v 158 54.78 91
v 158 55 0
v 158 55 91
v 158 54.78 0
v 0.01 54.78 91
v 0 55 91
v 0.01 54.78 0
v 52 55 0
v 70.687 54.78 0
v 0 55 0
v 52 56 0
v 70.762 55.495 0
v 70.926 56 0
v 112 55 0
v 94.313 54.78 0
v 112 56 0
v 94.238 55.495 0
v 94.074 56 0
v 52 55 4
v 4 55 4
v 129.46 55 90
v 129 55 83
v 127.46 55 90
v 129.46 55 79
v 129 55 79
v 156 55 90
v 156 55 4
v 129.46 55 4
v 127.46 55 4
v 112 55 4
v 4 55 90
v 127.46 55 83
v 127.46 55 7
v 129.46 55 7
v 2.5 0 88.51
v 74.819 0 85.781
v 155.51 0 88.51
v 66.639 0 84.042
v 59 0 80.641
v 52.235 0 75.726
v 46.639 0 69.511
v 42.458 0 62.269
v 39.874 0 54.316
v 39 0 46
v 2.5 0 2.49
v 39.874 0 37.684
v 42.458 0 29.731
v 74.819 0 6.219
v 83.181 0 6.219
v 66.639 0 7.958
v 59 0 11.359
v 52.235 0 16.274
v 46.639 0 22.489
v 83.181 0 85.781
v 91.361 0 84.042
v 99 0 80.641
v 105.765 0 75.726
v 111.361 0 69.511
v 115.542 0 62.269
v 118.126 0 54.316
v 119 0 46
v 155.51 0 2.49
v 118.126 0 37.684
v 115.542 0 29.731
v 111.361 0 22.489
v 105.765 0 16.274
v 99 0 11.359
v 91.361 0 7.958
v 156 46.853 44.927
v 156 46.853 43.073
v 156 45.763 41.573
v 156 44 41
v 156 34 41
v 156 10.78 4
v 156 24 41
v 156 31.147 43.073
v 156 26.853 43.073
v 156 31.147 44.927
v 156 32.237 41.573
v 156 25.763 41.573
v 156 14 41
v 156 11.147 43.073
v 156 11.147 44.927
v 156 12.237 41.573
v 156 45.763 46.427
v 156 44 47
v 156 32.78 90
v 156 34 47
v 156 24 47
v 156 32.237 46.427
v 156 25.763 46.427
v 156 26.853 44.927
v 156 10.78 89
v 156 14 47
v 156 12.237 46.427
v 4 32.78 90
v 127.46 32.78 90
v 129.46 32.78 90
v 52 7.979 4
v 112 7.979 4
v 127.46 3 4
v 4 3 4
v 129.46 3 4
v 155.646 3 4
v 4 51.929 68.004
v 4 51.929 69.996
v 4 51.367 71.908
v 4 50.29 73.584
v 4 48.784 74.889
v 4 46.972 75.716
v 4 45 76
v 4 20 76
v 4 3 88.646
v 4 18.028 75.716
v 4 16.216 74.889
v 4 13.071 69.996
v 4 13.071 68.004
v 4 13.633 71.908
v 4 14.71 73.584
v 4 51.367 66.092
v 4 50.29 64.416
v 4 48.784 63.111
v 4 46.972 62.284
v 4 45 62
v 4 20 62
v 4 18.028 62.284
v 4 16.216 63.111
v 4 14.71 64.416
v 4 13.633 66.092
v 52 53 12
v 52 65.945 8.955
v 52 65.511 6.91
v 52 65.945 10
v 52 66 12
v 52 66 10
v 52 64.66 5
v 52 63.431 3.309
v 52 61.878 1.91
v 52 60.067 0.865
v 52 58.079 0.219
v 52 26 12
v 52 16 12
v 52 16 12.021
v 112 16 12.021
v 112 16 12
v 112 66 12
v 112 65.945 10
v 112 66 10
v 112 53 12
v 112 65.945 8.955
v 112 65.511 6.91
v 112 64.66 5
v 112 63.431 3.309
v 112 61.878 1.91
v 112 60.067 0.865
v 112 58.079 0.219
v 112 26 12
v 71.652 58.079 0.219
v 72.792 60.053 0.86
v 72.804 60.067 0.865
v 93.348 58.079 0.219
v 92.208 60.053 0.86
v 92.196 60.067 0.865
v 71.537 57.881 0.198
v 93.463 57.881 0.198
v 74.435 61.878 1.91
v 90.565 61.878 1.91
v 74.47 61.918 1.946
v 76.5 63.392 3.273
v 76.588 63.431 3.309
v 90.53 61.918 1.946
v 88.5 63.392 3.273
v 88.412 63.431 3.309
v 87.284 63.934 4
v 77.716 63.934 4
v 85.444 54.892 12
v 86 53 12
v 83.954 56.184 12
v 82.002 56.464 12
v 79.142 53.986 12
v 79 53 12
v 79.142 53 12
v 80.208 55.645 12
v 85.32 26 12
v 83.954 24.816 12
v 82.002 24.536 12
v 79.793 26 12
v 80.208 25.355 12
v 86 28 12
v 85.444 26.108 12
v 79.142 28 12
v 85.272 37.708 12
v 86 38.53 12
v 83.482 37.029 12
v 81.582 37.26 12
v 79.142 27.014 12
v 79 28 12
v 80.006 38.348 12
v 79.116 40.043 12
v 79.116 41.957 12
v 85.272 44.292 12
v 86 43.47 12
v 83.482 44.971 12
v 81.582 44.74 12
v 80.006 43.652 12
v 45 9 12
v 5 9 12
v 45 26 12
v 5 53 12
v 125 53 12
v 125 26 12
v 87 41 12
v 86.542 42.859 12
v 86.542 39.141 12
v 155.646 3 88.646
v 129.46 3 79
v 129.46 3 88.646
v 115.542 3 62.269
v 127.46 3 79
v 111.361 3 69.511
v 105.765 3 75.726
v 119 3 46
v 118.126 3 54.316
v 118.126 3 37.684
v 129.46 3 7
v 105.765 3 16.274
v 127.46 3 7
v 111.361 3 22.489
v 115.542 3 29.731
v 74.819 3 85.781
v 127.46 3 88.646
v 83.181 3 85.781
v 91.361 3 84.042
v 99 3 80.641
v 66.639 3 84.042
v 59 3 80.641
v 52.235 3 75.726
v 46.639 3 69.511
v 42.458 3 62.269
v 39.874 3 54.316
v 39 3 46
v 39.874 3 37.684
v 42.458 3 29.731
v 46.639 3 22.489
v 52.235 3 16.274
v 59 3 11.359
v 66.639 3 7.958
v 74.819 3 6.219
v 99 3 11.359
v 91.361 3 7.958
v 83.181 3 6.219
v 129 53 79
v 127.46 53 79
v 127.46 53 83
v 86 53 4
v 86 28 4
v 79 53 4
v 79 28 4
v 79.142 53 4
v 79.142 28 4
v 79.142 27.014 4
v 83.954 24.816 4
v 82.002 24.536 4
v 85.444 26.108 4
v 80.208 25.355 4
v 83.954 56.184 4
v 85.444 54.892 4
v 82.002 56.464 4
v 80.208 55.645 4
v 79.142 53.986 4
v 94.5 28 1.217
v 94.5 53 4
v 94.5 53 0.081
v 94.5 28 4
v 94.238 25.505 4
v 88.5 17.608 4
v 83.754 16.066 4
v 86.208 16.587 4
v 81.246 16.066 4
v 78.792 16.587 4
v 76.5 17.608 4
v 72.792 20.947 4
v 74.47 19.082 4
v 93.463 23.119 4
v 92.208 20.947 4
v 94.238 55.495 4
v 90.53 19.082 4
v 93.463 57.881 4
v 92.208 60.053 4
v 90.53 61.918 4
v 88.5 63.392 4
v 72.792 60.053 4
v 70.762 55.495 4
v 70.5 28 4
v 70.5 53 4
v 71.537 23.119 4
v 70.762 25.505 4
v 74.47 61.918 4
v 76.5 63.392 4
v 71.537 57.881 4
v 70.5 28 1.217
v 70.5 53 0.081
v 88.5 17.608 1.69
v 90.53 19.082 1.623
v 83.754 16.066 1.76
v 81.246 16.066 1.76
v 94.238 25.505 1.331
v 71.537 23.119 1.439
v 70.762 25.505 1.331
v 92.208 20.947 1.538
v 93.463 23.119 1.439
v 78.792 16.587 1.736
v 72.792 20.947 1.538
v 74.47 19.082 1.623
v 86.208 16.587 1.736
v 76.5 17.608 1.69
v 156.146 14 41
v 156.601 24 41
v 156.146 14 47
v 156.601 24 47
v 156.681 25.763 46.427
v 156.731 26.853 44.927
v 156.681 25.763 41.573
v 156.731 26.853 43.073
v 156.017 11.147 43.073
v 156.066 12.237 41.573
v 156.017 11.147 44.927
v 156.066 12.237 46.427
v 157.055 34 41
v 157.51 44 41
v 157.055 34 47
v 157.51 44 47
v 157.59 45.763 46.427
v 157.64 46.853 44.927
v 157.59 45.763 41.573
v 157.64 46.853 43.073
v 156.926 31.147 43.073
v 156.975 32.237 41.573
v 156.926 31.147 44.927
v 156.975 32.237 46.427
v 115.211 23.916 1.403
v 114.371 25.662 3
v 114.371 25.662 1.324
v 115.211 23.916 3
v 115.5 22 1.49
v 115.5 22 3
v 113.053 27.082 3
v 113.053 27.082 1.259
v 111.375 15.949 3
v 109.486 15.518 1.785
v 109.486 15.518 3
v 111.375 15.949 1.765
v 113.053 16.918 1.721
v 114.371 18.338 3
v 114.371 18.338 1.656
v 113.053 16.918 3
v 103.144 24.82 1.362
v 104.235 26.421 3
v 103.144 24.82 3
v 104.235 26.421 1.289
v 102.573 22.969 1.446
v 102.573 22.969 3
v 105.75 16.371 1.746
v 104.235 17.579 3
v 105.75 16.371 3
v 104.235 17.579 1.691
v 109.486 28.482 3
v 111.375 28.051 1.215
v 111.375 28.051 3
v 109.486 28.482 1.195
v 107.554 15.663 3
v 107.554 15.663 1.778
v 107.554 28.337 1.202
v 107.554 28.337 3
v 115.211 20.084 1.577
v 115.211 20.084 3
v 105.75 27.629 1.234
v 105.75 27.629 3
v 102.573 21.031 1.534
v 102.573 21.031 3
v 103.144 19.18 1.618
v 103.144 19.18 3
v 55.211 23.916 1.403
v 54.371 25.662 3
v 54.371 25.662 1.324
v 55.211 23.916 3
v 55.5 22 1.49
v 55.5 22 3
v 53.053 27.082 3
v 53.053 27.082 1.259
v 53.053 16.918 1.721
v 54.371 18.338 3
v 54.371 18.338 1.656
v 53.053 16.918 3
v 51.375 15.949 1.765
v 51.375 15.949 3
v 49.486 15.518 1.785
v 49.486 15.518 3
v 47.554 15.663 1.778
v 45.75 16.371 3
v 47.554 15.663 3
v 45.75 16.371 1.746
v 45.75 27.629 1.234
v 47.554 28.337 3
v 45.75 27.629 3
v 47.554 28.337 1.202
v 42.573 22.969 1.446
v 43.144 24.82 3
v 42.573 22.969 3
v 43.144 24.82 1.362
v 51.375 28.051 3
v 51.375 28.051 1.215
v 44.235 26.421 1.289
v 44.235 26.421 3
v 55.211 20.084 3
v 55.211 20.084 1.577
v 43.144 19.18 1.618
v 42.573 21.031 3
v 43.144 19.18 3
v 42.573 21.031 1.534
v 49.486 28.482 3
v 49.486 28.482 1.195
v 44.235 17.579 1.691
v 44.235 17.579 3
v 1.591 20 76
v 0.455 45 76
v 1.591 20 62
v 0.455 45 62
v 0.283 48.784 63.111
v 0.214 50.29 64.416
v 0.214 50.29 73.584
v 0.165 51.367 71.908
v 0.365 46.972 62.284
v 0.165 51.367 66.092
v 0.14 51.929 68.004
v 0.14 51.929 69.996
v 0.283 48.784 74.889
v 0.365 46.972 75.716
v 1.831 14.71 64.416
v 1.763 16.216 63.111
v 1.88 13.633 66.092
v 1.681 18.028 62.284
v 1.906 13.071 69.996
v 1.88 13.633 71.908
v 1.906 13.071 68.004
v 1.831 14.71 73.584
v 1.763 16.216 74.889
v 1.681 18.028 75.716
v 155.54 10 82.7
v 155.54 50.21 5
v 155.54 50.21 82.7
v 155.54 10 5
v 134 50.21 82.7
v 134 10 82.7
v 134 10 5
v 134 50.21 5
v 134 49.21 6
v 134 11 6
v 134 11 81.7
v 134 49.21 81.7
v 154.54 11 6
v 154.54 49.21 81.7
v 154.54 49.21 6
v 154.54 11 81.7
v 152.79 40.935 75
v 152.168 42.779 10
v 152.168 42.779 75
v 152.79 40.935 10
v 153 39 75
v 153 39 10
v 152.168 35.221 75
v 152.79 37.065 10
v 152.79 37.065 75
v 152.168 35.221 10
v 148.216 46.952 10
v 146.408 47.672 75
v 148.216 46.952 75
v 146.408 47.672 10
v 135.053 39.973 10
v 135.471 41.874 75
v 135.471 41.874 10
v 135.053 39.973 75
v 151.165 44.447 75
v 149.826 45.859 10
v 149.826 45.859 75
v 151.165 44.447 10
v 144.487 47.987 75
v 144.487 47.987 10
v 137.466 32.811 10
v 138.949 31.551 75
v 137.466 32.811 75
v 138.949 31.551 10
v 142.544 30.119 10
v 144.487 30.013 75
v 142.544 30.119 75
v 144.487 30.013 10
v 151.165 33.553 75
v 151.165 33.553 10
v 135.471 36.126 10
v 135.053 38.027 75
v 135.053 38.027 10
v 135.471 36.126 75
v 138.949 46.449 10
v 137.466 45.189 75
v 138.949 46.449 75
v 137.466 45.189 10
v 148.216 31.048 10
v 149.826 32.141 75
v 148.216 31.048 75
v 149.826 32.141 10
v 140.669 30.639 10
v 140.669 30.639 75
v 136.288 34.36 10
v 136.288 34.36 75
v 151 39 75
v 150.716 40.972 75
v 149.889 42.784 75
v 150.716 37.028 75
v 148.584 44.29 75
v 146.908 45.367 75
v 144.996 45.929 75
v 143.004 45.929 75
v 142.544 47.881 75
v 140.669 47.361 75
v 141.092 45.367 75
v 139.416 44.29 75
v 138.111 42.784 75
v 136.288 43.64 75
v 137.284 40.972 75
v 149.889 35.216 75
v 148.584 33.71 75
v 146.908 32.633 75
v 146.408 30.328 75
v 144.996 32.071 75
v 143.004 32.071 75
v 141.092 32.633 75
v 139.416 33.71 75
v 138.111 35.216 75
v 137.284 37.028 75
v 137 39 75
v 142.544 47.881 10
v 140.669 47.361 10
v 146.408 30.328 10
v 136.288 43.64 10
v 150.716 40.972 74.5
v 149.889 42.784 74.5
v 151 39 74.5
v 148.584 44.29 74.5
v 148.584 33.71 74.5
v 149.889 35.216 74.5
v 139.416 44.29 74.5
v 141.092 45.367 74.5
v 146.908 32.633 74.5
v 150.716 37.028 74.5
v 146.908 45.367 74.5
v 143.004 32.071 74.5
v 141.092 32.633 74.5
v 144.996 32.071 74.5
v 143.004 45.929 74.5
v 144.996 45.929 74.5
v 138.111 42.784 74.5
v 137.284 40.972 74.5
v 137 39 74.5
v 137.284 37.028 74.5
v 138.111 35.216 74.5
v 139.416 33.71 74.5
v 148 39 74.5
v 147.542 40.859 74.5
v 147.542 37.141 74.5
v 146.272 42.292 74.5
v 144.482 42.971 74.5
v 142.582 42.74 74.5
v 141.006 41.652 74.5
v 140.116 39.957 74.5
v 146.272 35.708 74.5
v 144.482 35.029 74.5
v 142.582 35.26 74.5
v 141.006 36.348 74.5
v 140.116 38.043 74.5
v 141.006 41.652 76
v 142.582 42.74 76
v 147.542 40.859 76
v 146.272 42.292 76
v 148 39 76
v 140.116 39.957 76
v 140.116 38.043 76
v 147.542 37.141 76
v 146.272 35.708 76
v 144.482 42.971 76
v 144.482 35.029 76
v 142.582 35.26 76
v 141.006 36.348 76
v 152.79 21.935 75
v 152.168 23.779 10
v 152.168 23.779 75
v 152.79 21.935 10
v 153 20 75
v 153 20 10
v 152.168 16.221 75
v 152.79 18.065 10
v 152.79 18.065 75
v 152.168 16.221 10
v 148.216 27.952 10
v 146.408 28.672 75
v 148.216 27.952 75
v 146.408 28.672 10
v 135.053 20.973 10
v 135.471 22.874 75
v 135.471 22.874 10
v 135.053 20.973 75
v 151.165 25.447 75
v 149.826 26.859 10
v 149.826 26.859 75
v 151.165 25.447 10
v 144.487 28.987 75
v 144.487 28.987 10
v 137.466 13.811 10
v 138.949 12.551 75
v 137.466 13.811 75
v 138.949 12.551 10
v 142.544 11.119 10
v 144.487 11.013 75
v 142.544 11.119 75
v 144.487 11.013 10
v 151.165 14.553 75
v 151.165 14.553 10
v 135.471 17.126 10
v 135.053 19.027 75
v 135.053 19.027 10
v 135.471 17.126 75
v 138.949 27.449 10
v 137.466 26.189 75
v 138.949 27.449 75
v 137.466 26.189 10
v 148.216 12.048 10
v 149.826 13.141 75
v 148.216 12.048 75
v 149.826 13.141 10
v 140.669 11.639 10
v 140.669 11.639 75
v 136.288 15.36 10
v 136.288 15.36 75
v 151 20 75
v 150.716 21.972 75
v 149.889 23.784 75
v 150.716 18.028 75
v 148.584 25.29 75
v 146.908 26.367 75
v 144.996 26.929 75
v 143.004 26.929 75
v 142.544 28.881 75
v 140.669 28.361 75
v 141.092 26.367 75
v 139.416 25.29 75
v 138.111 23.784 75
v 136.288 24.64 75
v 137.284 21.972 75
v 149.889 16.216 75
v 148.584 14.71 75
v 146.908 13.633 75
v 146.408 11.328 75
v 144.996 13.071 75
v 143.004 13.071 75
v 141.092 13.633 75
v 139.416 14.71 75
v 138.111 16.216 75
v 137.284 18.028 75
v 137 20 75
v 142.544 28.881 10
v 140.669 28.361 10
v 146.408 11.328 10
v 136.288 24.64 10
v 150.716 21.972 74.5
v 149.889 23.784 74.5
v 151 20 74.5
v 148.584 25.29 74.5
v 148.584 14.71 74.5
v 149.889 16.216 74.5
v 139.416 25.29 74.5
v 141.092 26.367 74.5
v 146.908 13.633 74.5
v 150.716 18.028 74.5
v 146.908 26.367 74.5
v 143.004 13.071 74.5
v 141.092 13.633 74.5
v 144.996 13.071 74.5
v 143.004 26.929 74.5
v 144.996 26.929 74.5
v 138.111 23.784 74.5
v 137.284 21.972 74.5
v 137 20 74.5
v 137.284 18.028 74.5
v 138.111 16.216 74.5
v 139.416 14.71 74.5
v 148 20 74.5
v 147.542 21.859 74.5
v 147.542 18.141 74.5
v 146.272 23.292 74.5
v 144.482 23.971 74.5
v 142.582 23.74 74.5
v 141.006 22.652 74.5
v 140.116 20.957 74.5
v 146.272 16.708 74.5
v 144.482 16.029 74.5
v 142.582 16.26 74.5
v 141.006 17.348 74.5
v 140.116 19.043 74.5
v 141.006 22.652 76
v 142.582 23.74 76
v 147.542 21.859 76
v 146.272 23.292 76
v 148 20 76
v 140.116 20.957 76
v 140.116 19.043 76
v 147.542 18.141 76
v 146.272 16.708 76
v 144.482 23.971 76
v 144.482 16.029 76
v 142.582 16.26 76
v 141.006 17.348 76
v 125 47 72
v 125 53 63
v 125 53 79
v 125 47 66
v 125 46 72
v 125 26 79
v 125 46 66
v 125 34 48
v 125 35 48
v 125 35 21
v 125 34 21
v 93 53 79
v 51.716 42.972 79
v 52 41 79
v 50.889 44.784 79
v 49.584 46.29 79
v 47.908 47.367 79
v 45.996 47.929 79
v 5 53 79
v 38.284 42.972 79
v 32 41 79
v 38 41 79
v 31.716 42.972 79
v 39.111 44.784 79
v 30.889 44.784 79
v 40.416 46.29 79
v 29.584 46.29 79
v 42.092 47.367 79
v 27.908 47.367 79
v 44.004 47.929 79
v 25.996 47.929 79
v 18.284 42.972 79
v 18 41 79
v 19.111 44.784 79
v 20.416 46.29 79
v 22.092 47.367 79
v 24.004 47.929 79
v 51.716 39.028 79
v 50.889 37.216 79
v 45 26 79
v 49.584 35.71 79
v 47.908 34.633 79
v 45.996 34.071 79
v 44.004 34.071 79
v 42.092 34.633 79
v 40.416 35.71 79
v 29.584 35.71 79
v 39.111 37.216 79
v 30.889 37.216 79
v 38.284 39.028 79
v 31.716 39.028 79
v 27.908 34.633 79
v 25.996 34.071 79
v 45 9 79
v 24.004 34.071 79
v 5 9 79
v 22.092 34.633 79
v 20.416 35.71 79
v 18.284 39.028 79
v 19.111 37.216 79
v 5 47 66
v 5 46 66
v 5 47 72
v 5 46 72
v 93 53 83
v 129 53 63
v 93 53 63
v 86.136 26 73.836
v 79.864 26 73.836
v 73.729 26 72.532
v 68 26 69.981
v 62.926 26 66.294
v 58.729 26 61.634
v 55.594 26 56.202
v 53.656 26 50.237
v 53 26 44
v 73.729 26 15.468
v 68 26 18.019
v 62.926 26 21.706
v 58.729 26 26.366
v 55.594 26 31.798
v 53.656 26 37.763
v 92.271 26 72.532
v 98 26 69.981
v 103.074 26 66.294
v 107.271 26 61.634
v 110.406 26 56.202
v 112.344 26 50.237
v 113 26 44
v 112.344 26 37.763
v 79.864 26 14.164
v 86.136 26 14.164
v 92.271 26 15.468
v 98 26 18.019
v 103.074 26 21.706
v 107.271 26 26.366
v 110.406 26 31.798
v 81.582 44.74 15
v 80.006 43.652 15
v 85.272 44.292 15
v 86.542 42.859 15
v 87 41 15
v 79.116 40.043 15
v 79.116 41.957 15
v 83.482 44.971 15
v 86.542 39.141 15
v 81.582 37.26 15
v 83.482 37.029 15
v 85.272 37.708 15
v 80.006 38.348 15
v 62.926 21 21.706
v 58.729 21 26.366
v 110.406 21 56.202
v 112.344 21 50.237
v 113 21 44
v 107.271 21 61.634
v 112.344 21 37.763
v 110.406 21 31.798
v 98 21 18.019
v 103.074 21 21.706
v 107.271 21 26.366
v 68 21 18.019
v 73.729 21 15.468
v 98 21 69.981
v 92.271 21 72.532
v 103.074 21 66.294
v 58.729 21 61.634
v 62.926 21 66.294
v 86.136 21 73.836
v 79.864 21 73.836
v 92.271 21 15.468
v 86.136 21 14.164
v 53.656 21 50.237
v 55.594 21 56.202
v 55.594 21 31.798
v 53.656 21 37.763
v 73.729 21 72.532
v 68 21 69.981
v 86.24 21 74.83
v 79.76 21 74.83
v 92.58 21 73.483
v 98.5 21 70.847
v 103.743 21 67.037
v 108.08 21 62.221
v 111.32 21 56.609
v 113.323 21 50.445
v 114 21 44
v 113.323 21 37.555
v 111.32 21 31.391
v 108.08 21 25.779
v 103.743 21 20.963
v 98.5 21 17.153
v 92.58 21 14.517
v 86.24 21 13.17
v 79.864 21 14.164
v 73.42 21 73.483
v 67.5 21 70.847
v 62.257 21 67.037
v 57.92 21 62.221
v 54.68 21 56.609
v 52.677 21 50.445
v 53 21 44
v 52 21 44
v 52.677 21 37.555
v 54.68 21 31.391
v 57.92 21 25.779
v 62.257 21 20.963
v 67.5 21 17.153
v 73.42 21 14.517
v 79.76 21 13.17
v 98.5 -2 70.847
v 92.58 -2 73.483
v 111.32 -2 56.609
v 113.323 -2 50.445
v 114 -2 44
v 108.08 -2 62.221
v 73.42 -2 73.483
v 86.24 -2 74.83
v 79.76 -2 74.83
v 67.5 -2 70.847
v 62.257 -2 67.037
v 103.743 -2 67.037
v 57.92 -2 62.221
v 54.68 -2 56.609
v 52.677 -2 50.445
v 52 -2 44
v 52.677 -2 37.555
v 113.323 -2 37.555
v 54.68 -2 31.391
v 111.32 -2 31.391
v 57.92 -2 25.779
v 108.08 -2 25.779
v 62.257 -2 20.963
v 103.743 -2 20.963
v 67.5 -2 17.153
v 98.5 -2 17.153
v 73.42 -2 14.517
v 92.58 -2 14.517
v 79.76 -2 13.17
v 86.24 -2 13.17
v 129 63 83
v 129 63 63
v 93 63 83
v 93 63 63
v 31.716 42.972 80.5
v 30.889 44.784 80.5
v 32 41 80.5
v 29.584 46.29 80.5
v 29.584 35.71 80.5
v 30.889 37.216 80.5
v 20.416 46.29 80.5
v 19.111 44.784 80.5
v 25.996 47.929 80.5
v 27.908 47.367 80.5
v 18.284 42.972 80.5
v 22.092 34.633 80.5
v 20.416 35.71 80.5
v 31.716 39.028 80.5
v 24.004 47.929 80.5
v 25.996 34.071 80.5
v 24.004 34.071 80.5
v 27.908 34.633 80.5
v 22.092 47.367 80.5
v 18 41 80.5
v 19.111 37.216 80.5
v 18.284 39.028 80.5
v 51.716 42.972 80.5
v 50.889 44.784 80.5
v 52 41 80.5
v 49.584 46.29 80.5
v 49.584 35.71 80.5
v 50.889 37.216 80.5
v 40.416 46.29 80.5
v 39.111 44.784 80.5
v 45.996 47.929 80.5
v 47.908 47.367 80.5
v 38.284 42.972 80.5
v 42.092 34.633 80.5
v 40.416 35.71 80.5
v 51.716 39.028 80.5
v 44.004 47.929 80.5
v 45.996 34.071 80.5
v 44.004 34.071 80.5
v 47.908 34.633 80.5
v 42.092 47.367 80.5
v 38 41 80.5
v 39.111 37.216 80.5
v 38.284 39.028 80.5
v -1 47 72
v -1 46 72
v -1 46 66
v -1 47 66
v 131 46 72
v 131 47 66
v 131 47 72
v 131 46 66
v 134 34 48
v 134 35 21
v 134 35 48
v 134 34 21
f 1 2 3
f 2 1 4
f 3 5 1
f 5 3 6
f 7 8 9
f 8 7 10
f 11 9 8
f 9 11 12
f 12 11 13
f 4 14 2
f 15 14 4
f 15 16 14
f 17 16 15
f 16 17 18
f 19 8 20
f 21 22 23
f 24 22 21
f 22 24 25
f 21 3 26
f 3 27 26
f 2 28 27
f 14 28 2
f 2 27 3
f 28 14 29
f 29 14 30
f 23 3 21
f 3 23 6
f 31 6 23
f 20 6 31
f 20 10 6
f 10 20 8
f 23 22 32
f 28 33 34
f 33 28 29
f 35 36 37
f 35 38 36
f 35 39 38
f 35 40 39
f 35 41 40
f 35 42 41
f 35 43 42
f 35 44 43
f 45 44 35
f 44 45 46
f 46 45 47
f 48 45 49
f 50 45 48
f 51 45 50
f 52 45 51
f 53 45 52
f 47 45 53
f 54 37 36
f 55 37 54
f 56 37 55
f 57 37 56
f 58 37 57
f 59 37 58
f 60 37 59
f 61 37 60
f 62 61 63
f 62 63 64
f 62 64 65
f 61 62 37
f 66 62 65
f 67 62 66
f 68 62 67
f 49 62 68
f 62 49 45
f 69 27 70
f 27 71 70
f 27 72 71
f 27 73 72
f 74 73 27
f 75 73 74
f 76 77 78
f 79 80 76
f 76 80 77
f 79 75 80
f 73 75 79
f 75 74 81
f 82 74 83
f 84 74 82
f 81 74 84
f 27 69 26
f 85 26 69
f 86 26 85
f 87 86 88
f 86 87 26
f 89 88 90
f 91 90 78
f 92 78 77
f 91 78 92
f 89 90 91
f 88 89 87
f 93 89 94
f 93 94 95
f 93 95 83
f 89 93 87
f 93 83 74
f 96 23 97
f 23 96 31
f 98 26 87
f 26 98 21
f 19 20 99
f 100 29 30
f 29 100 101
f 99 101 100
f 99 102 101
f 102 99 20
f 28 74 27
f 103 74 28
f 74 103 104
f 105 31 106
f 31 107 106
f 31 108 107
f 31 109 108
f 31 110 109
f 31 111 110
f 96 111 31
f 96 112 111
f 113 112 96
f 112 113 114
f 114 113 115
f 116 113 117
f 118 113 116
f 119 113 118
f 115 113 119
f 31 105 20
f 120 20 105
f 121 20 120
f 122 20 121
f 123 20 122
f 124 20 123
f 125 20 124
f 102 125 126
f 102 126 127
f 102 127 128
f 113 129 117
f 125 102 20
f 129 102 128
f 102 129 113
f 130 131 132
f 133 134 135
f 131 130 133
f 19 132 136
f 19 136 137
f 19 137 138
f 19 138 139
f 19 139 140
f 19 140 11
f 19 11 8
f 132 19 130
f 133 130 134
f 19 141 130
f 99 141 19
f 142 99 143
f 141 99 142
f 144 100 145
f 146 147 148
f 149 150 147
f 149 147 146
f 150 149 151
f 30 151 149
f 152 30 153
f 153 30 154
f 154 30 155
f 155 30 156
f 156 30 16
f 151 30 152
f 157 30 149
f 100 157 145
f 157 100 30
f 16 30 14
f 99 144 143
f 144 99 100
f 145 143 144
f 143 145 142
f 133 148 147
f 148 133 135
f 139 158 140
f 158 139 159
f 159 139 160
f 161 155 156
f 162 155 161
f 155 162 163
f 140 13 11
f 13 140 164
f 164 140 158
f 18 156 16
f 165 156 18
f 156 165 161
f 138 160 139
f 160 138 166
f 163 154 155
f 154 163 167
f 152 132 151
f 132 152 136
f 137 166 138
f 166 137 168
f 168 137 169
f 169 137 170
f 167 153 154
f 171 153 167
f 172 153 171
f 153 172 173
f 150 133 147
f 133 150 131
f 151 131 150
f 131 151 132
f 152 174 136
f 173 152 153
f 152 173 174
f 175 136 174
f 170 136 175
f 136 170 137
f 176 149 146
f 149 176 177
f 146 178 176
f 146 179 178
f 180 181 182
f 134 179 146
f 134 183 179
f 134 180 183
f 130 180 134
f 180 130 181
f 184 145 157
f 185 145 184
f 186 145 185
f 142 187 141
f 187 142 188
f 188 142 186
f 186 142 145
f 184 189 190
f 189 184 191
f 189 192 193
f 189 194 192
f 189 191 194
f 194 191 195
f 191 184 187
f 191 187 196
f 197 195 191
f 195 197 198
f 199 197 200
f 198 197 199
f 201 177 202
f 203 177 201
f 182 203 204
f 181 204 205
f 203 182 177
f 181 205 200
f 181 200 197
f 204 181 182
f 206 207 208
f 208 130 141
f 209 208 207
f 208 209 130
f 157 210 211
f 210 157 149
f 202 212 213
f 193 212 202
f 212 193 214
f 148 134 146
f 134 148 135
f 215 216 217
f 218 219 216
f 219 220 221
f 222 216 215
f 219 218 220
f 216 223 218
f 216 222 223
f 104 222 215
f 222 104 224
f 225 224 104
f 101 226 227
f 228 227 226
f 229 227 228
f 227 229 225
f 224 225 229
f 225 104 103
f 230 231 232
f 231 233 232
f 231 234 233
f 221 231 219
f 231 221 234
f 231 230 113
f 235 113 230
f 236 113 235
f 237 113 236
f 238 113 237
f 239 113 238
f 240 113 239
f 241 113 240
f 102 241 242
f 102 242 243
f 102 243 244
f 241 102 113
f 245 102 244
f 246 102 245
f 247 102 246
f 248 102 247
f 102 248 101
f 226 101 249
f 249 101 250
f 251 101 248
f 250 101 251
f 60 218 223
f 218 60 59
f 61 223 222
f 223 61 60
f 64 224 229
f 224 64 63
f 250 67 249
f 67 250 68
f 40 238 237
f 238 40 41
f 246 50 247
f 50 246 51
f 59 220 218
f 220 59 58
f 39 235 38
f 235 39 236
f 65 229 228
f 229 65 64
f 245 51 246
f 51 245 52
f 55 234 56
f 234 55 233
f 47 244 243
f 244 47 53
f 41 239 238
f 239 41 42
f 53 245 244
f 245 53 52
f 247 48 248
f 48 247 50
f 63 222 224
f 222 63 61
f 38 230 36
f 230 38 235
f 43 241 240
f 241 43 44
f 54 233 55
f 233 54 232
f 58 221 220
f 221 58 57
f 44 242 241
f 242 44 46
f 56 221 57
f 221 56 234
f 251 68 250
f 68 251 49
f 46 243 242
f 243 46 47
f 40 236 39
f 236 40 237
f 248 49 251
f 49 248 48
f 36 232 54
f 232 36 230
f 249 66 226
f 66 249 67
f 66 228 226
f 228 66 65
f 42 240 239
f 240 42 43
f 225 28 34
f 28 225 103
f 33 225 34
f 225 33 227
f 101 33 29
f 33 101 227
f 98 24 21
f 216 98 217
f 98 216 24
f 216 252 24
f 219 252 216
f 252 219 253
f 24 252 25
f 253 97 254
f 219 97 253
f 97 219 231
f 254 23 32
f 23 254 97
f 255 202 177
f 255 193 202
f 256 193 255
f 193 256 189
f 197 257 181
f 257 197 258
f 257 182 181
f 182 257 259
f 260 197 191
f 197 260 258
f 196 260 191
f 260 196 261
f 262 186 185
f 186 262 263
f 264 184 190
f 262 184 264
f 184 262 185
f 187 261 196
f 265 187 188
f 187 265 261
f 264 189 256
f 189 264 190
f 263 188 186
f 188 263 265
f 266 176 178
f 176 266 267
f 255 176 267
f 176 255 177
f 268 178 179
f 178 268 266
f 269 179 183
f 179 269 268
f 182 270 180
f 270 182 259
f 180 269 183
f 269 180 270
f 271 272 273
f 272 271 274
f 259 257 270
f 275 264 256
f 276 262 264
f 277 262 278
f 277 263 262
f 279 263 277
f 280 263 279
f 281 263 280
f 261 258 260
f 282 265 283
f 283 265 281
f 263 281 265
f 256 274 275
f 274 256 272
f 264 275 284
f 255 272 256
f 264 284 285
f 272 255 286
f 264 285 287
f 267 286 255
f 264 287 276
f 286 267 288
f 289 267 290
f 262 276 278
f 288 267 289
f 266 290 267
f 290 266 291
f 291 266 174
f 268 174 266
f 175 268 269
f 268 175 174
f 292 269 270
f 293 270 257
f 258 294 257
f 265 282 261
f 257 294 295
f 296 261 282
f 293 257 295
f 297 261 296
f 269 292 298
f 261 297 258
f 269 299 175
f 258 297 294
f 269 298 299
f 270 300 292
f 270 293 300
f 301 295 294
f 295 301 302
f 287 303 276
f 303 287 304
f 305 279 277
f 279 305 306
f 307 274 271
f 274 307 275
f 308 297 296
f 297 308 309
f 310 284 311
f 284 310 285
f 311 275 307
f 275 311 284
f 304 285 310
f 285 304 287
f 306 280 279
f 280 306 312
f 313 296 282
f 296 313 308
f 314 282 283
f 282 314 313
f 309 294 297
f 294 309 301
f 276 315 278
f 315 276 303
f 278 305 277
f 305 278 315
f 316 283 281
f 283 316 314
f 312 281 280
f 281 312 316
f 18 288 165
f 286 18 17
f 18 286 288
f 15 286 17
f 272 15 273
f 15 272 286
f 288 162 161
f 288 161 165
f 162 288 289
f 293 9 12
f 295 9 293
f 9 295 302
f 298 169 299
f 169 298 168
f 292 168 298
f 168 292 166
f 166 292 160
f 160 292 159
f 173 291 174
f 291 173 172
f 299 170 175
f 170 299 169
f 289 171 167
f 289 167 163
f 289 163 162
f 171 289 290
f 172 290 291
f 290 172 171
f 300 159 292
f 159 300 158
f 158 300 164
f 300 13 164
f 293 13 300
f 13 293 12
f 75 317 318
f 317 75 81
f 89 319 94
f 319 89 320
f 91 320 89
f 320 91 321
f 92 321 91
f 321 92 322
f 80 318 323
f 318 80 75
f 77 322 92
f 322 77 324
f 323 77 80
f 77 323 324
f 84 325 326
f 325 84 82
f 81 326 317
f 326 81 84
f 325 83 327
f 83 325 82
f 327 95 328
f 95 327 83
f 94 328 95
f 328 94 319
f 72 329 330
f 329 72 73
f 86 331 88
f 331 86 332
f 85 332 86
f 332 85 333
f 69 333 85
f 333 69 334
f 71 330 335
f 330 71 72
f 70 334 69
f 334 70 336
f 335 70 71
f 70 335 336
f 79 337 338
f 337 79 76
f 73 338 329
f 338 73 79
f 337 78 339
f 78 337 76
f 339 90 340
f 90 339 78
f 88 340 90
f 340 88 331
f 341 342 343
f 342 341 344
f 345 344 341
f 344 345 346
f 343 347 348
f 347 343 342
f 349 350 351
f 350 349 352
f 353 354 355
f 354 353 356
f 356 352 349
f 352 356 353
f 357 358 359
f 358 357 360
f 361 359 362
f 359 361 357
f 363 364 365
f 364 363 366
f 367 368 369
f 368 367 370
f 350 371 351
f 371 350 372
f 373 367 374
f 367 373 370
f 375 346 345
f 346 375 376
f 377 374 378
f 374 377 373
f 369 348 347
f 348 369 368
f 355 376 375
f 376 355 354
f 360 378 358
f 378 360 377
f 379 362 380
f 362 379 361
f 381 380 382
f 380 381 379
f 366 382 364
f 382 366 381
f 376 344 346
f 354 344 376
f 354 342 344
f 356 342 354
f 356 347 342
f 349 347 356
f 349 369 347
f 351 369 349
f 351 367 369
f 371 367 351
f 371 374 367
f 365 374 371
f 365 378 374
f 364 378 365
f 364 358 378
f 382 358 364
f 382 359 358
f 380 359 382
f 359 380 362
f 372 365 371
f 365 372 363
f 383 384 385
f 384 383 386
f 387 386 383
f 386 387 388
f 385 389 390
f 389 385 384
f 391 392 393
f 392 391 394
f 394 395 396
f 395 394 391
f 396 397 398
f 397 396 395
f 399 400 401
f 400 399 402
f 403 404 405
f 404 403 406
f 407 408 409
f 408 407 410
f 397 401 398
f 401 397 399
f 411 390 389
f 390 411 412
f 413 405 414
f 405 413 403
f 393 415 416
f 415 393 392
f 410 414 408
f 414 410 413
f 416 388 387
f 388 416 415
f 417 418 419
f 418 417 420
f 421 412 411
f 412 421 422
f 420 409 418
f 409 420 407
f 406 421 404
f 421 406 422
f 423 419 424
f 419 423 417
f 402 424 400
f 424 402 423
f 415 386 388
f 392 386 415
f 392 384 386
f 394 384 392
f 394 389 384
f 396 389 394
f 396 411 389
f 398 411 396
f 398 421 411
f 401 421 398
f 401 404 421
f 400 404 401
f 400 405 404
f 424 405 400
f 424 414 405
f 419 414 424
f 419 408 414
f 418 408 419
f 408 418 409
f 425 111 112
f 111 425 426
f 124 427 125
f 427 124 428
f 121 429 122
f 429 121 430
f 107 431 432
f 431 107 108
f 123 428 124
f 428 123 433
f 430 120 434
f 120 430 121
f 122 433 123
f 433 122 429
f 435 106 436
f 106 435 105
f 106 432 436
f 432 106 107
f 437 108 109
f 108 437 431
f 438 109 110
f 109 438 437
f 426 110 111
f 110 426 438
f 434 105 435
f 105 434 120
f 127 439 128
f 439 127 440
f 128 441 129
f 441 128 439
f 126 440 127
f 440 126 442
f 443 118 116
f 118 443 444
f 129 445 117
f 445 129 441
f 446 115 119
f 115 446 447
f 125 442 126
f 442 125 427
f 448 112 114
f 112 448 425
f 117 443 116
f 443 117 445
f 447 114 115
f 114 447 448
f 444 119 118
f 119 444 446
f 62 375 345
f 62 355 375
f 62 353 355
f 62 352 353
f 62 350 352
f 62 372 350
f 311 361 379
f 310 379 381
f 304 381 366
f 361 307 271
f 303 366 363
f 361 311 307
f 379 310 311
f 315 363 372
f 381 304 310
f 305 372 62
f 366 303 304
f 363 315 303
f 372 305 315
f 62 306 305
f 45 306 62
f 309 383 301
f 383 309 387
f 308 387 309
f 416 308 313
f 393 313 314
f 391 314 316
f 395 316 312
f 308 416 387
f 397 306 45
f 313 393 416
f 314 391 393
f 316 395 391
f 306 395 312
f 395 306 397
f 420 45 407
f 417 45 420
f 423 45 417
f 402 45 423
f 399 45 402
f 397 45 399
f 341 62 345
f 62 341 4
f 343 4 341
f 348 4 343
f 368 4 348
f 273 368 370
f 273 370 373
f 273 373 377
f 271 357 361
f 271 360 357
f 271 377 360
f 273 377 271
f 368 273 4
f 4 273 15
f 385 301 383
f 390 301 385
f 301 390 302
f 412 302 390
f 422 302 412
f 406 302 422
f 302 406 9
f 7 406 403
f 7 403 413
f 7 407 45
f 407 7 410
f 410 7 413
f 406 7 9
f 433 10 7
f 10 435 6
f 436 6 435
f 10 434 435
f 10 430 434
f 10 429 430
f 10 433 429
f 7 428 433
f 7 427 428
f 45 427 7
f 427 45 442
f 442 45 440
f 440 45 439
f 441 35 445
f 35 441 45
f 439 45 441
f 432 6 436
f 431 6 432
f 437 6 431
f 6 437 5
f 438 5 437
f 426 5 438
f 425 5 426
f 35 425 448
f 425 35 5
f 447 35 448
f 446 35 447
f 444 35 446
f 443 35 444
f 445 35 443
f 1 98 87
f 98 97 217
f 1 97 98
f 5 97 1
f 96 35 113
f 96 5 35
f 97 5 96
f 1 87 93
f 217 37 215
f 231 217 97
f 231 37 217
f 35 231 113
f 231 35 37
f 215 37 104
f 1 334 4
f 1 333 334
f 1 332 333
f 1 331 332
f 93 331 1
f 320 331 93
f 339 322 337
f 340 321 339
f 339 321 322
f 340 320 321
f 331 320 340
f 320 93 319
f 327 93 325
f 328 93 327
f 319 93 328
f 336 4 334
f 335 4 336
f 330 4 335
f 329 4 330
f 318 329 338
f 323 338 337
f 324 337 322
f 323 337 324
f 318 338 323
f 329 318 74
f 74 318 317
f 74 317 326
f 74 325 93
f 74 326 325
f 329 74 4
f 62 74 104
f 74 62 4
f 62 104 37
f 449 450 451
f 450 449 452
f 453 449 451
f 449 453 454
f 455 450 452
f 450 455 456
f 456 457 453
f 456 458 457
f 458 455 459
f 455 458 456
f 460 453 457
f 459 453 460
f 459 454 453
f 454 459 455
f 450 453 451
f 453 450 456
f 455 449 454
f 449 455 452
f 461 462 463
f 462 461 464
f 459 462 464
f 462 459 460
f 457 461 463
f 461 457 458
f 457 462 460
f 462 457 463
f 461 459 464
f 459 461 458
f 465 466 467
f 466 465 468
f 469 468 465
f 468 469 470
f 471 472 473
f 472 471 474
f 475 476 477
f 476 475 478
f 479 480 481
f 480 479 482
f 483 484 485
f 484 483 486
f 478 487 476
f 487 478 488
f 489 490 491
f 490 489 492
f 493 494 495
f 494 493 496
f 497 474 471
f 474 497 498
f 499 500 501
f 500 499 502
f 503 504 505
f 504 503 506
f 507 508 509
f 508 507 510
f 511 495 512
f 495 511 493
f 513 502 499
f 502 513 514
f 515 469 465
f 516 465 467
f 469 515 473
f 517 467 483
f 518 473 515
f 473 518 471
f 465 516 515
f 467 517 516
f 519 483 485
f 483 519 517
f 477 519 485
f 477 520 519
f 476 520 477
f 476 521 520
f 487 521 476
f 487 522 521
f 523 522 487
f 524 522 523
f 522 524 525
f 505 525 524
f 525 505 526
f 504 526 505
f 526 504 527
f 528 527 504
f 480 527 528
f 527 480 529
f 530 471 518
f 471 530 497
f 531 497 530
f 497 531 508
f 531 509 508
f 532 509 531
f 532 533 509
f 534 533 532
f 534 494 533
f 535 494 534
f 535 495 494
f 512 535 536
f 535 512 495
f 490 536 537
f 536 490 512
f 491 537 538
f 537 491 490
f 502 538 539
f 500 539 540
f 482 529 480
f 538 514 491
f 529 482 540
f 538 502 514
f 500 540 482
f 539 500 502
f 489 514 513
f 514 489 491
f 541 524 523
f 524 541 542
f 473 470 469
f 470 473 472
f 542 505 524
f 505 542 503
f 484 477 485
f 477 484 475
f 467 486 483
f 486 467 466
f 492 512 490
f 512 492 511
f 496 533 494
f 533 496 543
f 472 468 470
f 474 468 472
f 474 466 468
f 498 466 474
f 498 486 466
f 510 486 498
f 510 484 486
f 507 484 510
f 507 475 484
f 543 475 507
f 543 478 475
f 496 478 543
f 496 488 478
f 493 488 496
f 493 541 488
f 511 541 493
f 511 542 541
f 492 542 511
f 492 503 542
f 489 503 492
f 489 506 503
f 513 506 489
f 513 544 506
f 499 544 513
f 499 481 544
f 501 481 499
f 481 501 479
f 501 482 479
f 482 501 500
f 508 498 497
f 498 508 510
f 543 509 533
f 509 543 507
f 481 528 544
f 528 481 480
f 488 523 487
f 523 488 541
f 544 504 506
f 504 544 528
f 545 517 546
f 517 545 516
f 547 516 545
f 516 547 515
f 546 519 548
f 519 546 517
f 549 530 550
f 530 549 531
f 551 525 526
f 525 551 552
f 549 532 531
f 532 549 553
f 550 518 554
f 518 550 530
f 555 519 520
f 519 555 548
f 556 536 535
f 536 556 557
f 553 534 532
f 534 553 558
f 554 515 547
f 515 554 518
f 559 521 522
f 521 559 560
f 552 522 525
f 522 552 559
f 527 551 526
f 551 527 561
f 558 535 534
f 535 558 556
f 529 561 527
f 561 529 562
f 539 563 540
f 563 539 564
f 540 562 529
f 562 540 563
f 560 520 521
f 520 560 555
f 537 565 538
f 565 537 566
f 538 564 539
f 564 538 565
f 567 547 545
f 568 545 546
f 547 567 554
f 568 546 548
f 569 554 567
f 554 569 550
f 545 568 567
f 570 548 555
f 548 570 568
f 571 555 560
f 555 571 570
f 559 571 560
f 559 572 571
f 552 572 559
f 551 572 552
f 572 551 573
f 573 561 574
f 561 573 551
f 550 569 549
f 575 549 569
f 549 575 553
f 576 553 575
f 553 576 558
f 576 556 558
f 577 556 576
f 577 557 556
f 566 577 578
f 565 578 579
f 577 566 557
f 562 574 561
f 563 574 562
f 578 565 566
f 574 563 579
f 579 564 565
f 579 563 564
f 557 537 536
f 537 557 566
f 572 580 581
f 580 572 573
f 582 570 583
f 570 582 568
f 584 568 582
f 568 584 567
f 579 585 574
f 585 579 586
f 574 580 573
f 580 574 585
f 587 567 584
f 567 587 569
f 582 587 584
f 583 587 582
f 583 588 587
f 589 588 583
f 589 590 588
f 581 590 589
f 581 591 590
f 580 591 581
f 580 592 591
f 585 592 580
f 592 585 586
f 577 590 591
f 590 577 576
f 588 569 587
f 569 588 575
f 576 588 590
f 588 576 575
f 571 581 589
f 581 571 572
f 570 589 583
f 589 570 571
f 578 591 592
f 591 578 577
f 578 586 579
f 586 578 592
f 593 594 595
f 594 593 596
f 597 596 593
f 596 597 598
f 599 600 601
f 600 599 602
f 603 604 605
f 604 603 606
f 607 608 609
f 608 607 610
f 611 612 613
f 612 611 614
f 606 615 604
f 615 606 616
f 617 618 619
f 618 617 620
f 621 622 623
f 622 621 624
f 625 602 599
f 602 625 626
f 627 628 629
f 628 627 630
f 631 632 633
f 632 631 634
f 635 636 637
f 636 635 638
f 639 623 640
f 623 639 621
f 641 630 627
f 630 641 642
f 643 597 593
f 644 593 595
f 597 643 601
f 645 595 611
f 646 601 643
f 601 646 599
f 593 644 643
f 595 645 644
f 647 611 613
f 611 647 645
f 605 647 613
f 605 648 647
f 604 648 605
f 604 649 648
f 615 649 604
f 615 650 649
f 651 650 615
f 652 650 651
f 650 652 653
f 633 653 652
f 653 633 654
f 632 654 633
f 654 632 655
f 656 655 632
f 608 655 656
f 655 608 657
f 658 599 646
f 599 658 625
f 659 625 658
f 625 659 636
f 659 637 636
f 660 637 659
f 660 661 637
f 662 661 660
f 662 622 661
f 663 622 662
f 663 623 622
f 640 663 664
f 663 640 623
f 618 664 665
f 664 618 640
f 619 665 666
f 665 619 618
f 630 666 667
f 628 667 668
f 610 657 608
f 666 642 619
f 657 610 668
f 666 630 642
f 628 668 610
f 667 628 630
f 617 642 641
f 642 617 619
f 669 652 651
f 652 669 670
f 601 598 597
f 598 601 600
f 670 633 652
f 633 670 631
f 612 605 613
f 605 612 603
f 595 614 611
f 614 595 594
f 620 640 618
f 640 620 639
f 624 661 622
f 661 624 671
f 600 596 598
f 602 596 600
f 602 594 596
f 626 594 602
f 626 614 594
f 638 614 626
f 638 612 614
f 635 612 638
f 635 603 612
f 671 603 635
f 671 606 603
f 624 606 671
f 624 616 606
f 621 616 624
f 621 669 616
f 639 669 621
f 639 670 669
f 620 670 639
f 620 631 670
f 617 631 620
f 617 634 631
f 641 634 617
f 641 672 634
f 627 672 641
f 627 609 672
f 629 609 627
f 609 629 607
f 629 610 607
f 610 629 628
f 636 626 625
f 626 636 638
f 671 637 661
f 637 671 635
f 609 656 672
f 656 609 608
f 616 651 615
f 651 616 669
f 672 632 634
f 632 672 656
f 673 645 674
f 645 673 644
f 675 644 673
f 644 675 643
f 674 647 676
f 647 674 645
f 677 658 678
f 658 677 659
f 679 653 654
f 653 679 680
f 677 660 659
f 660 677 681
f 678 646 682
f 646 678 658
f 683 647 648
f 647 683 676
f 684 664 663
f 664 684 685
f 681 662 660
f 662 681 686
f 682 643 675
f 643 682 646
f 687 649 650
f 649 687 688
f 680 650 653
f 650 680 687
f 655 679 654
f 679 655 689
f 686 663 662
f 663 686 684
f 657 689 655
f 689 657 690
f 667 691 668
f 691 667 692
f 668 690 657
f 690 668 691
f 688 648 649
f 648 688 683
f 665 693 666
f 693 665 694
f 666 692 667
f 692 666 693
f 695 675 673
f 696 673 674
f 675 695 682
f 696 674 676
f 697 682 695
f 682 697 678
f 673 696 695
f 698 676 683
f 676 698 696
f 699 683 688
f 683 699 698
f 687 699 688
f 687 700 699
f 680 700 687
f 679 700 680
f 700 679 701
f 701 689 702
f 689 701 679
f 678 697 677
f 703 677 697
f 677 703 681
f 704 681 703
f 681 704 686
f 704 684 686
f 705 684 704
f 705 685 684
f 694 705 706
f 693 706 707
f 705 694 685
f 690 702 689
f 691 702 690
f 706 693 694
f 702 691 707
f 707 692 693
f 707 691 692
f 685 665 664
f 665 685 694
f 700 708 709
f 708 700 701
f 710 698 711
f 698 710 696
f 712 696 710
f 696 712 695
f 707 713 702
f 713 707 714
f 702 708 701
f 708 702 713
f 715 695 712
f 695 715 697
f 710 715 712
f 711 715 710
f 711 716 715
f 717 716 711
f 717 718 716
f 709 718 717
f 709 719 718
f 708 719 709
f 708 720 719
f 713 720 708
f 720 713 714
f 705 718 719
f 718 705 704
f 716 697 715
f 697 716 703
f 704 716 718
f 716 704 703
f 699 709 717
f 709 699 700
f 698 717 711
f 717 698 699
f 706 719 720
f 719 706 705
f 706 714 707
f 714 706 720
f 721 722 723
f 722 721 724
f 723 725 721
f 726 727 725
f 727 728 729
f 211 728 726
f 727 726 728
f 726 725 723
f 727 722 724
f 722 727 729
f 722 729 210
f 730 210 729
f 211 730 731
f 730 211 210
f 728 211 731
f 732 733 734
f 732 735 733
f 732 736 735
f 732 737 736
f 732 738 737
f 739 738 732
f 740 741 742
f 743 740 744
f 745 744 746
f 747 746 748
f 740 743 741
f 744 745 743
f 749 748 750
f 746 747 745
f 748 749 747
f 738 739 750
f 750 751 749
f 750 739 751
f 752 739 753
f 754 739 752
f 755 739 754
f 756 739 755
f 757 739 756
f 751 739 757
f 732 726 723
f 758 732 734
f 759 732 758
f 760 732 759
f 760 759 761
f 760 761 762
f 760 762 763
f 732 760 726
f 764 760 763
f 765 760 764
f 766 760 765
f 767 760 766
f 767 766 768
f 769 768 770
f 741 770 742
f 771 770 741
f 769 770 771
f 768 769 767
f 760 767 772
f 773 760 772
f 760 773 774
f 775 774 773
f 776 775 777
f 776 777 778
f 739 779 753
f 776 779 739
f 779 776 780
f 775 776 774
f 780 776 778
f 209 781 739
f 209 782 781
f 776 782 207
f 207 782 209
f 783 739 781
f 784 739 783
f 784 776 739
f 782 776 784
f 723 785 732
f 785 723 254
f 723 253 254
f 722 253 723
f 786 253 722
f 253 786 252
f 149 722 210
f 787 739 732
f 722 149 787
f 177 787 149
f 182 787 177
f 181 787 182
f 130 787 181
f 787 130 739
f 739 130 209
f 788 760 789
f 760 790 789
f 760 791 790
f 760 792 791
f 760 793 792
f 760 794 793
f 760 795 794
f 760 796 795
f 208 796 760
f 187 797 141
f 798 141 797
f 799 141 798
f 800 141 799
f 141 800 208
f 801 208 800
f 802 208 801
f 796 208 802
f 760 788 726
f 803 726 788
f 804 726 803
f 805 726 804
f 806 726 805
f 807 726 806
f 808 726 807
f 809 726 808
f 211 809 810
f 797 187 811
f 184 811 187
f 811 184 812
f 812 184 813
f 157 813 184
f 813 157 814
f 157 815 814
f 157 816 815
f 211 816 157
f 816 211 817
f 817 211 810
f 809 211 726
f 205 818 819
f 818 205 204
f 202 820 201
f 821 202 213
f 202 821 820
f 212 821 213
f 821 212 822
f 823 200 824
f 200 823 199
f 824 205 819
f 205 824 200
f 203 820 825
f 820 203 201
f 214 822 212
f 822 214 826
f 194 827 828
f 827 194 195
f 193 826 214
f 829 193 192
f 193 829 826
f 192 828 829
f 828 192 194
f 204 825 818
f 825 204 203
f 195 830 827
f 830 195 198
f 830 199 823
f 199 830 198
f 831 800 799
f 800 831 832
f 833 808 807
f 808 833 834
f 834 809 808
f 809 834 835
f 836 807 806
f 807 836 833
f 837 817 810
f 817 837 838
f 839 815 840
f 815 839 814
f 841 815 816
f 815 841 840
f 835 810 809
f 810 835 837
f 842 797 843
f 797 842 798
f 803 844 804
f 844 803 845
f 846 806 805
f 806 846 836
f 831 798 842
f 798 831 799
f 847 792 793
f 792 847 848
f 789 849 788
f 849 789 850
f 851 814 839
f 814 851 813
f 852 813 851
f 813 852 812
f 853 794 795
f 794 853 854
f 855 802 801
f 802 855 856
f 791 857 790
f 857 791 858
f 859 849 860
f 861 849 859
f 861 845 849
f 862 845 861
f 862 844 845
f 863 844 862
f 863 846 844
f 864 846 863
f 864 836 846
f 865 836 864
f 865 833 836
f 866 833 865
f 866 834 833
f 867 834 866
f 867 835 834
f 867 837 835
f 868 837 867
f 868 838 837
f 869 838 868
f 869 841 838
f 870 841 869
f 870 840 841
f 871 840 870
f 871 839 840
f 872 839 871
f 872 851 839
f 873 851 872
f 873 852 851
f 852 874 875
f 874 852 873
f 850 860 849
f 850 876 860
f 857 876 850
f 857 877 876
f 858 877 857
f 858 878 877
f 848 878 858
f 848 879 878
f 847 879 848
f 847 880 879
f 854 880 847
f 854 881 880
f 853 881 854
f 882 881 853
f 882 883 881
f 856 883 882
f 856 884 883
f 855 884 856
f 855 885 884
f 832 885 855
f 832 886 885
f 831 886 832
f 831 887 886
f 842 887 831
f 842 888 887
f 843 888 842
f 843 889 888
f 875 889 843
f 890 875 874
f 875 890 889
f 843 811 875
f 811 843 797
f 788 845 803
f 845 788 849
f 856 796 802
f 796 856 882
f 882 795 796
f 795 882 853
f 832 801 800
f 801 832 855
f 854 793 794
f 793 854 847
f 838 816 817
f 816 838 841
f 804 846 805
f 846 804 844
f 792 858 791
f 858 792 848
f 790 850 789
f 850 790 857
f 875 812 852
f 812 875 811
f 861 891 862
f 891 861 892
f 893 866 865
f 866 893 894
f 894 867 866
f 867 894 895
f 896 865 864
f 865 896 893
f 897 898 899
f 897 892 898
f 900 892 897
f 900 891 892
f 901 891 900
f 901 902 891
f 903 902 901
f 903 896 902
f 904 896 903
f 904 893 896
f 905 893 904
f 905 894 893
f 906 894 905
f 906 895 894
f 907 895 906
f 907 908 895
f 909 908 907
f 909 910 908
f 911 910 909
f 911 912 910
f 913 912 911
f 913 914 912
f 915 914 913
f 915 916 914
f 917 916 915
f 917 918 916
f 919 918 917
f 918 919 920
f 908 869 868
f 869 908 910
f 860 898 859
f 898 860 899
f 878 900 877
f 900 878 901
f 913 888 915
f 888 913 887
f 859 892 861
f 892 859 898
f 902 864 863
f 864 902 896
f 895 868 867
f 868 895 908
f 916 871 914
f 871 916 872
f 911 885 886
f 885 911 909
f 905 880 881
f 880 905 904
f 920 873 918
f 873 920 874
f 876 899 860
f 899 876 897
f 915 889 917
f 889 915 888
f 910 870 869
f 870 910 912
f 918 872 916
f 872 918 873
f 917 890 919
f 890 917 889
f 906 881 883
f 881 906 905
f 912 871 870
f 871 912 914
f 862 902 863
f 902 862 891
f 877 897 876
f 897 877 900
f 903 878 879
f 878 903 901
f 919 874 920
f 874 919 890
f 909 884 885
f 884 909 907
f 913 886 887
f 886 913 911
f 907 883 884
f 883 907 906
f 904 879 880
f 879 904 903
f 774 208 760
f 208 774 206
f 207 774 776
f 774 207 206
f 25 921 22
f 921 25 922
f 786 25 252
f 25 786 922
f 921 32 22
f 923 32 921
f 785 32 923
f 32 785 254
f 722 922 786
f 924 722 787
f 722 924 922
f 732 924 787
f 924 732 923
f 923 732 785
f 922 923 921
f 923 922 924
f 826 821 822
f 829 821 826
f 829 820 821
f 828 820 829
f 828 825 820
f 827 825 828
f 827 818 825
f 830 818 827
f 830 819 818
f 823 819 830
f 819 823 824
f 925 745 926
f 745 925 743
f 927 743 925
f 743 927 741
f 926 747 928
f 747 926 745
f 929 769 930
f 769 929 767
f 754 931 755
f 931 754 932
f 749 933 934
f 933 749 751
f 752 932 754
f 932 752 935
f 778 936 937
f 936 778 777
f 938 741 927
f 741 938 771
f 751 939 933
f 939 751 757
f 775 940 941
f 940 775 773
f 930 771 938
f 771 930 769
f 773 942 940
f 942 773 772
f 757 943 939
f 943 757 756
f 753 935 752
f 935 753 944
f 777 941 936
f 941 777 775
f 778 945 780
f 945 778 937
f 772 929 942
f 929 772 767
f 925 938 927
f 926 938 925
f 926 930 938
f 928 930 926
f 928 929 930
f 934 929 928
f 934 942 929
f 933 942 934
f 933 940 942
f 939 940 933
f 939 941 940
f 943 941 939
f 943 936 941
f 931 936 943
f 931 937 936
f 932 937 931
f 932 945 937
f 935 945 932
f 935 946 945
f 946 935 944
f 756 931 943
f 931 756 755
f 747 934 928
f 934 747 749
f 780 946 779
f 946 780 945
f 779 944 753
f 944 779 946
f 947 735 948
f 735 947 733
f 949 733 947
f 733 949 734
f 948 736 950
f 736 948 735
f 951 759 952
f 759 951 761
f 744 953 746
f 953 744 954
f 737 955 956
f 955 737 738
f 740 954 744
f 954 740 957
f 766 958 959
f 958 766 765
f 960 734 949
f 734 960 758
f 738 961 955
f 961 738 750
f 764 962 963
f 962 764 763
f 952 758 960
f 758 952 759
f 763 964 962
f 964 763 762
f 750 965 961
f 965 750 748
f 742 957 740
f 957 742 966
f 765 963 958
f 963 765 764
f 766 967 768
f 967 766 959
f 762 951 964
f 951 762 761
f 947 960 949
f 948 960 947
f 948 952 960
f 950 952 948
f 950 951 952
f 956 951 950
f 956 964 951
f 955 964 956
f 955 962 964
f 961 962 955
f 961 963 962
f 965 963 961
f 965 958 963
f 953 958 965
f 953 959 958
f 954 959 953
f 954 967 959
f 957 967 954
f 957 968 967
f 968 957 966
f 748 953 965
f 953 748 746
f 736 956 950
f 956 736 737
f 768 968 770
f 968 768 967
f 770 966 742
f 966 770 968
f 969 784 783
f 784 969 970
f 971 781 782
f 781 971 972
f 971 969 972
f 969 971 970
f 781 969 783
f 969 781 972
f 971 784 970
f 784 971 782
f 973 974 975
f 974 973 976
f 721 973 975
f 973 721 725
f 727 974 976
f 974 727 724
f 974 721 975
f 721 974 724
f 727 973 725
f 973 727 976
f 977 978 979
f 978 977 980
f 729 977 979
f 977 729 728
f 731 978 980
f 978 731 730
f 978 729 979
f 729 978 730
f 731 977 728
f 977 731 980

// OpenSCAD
// file: controllerHolder1050.scad
// controllerHolder();

module controllerHolder() {

    width = 158;
    depth = 96;
    height = 1.5;
    
    draw_pcb = false;

    translate([54, 17, 0]) {
        if (draw_pcb) {
        color([0.7, 0.7, 0.7]) translate([0, 0, 3]) import(file = "controller4.dxf");
        }

        translate([0,   53.3,   0]) pug();
        translate([33,  65,     0]) pug();
        translate([33,  10,     0]) pug();
        translate([65,  3.5,    0]) pug();
        translate([88,  3.5,    0]) pug();
        translate([65,  61.5,   0]) pug();
        translate([88,  61.5,   0]) pug();
    }


    difference() {
        baseplate();
        
        // viewfinder cutout
        translate([31.5, 7.5, -1]) cube([40, 25, 10]);
    
        // pi cutout
        translate([122, 18.5, -1]) {
            cube([17, 62, 10]);    
        }
        translate([117, 24, -1]) {
            cube([27, 51, 10]);    
        }
        
//        // pressure cutouts
//        translate([width-1.6, 10, -1]) {
//            cube([0.8, depth-20, 10]);    
//        }
//        
//        translate([width-3.2, 10, -1]) {
//            cube([0.8, depth-20, 10]);    
//        }
    }
    


    // modules
    
    module baseplate() {
        translate([0, depth, height])
        rotate([180, 0, 0])
        hull() {
            translate([0, 0, 0]) {

                difference() {
                    union() {
                        translate([0, 0, 0]) color([1, 1, 1, 0.3]) cube([width, depth, 0.1]);
                        // side pressure nose
                        // translate([width, depth/2, 0]) cylinder(h=height, d=3, $fn=32);
                    }

                    translate([-0.01, -0.01, -1])           rotate([0, 0, 0]) cornercutout(10);
                    translate([width+0.01, -0.01, -1])      rotate([0, 0, 90]) cornercutout(10);
                    translate([width+0.01, depth+0.01, -1]) rotate([0, 0, 180]) cornercutout(10);
                    translate([-0.01, depth+0.01, -1])      rotate([0, 0, 270]) cornercutout(10);
                }
            }
            translate([1, 1, height]) {

                scale([0.98, 0.98]) difference() {
                    union() {
                        translate([0, 0, 0]) color([1, 1, 1, 0.3]) cube([width, depth, 0.1]);
                        // side pressure nose
                        // translate([width, depth/2, 0]) cylinder(h=height, d=3, $fn=32);
                    }

                    translate([-0.01, -0.01, -1])           rotate([0, 0, 0]) cornercutout(10);
                    translate([width+0.01, -0.01, -1])      rotate([0, 0, 90]) cornercutout(10);
                    translate([width+0.01, depth+0.01, -1]) rotate([0, 0, 180]) cornercutout(10);
                    translate([-0.01, depth+0.01, -1])      rotate([0, 0, 270]) cornercutout(10);
                }
            }
        }
    }

    module pug() {
        cylinder(h=5, d=2.5, $fn=32);
        translate([0, 0, 4.5]) cylinder(h=0.5, r1=1.4, r2=1.25, $fn=32);
        translate([0, 0, 4]) cylinder(h=0.5, r1=1.25, r2=1.4, $fn=32);
    }

    module cornercutout(diameter) {
        difference() {
            cube([diameter, diameter, 10]);
            translate([diameter, diameter, 0]) cylinder(h=12, d=diameter*2);
        } 
    }
}
// main file
include <controllerHolder1050.scad>;

// GLOBAL VARS

// dim_case_interior   = [160,     55,     93  ];
dim_case_interior   = [158,     55,     91  ];
dim_battery_holder  = [21.54,40.21,     77.7];

// ----------------------------------------------

color([0.2, 0.3, 0.9, 0.9]) enclosure();
translate([134, 10, 5]) battery_holder();
translate([5, 26, 12]) camera();

// translate([160, 70, 90]) rotate([-90, 0, 180]) color([0.5, 0.5, 0.5, 0.2]) controllerHolder();

// translate([dim_case_interior[0]/2, 0, 46]) color([0.5, 0.5, 0.5, 1]) filter_adapter();

// pelicase 
//color([0, 0, 0, 0.1]) cube([160, 70, 93]);

//color([0.3, 0.3, 0.3, 0.8]) translate([95, 60, 14]) {
//    rotate([105, 0, 180]) {
//    //rotate([ 90, 0, 180]) {
//        difference() {
//            union() {
//                cube([50.8, 65, 2]);
//                translate([55, 0, 0]) cube([31, 65, 2]);
//                translate([50, 38, 0]) cube([5, 20, 2]);
//                translate([-23, 10, 0]) cube([20, 20, 2]);
//                
//                translate([87, 10, 0]) cube([10, 20, 2]);
//            }
//            translate([0, 51, -1]) cube([6, 14, 4]);
//        }
//    }
//}

// --------- modules --------- //

module enclosure1120() {
    difference() {
        cube([184, 78, 121]);
        translate([4, 4, 4]) cube([176, 78, 113]);
    }
}

module enclosure() {
            
    difference() {
        union() {
            difference() {
                cube(dim_case_interior);
                
                translate([4, -1, 4]) {
                    cube([152, 80, 86]);    
                }
            }

            // socket triangle
            translate([52, 16, 0]) {
                rotate([0, 0, 0])
                
                
                triangle(60, 17);
            }
            // socket block
            translate([52, 16, 0]) {
                difference() {  
                    cube([60, 50, 12]);    
                    translate([-10, 40, 10]) {
                        rotate([0, 90, 0]) {
                            difference() {
                                cube([12, 12, 80]);
                                translate([0, 0, -10]) {
                                    cylinder(h = 100, d = 20); 
                                }
                            }
                        }
                    }
                }
            }
            
            // front
            difference() {
                cube([dim_case_interior[0], 3, dim_case_interior[2]]);
                translate([dim_case_interior[0]/2,4,46]) {
                    rotate([90, 0, 0]) {
                        cylinder(h=10, d=80);
                    }
                }
            }
            
            battery_holder_distance = dim_case_interior[0] - 7 - dim_battery_holder[0] - 2;
            translate([battery_holder_distance, 0, 0]) {
                cube([2, dim_case_interior[1], 7]);
            }
            translate([battery_holder_distance, 0, dim_case_interior[2] - 12]) {
                cube([2, dim_case_interior[1], 12]);
            }
            
        }
        
        // edges
        
        translate([0, 0, -0.01]) rotated_prism(dim_case_interior[0], dim_case_interior[1], 2.5);
        translate([0, 0, dim_case_interior[2]]) rotate([0, 90, 0]) rotated_prism(dim_case_interior[2], dim_case_interior[1], 2.5);
        translate([dim_case_interior[0], 0, dim_case_interior[2] + 0.01]) rotate([0, 180, 0]) rotated_prism(dim_case_interior[0], dim_case_interior[1], 2.5);
        translate([dim_case_interior[0] + 0.01, 0, 0]) rotate([0, 270, 0]) rotated_prism(dim_case_interior[2], dim_case_interior[1], 2.5);
        
        // threadhole
        translate([79, 28, -1]) {
            camera_threadhole();
        }
        
        // battery holder holes
        translate([dim_case_interior[0], 24, dim_case_interior[2]/2]) {
            rotate([90, 90, 270]) threadhole(3, 6, 3, 10, 10);
        }
        translate([dim_case_interior[0], 44, dim_case_interior[2]/2]) {
            rotate([90, 90, 270]) threadhole(3, 6, 3, 10, 10);
        }
        
        // tripod mount holes
        translate([dim_case_interior[0]/2, 22, -1]) {
            space = [83, 40];
            height = 4;
            diameter = 13; //7.5;

            //cube([space[0], space[1], 10], center=true);
            
            translate([30, 0, 0]) cylinder(h=height, d=diameter);
            translate([-30, 0, 0]) cylinder(h=height, d=diameter);
        }

        // camera battery door hole
        translate([4, 14, 1]) {
        //     cube([46, 42, 10]);
            
            // cuttingholes
//            translate([1, 1, -1]) {
//                cylinder(h=2, d=2);
//            }
//            translate([46-2, 1, -1]) {
//                cylinder(h=2, d=2);
//            }
//            translate([1, 34-2, -1]) {
//                cylinder(h=2, d=2);
//            }
//            translate([46-2, 34-2, -1]) {
//                cylinder(h=2, d=2);
//            }
        }
        
        // side door
        translate([-2, 20, 62]) 
        union() {
            cube([10, 25, 14]);
            translate([0, 25, 7]) {
                rotate([0, 90, 0]) cylinder(h=10, d=14);
            }
            translate([0, 0, 7]) {
                rotate([0, 90, 0]) cylinder(h=10, d=14);
            }
        }
    }
}

module camera_threadhole() {
    // 1/4 inch = 0,635cm
    screw_hole_diameter = 7;
    socket_diameter     = 24;
    socket_height       = 5;
    length              = 25;
    height              = 14;
    
    threadhole(screw_hole_diameter, 
                    socket_diameter,
                    socket_height,
                    length,
                    height);
}

module threadhole(  screw_hole_diameter, 
                    socket_diameter,
                    socket_height,
                    length,
                    height) {
                        
    cube([screw_hole_diameter, length, height]);
    
    translate([screw_hole_diameter/2, 0, 0]) {
        cylinder(h=height, d=screw_hole_diameter);
    }
    
    translate([screw_hole_diameter/2, length, 0]) {
        cylinder(h=height, d=screw_hole_diameter);
    }
    
    translate([-(socket_diameter/2 - screw_hole_diameter/2), 0, 0]) {
        cube([socket_diameter, length, socket_height]);
    }
    
    translate([screw_hole_diameter/2, 0, 0]) {
        cylinder(h=socket_height, d=socket_diameter);
    }
    
    translate([screw_hole_diameter/2, length, 0]) {
        cylinder(h=socket_height, d=socket_diameter);
    }
}

module camera() {

    translate([0, -17, 0]) {
        cube([40, 17, 67]);
    }
    translate([88, 27, 51]) {
        cube([36, 10, 20]);
    }

    // tripod screw thread
    difference() {
        cube([120, 27, 67]); // <--
        translate([78, 15, -1]) {
            cylinder(h = 5, d = 8);
        }
    }
    translate([78, 15, 3]) {
        color([1, 0, 0]) cylinder(h = 1, d = 8);
    }
    
    // knobs
    translate([20, 15, 67]) {
        cylinder(h = 1.5, d = 14);
    }
    translate([40, 15, 67]) {
        cylinder(h = 1.5, d = 14);
    }
    
    // belt attachment holder
    translate([-6, 20, 54]) {
        cube([6, 1, 6]);
    }
    translate([120, 20, 54]) {
        cube([6, 1, 6]);
    }

    // lens mount and lens
    translate([78, 0, 32]) {
        rotate([90]) {
            color([1,0,0]) cylinder(h = 5, d = 60);
            
            // lens
            translate([0, 0, 5]) {
            cylinder(h = 23, d = 62);
            }
        }
    }
    
    // port door
    translate([120, 8, 9]) cube([9, 1, 27]);
}

module battery_18650() {
    difference() {
        cylinder(h = 65, d = 18);
        translate([0, 0, 64.5]) {
            cylinder(h = 1, d = 14); 
        }  
    }
    
    translate([0, 0, 64]) {
        cylinder(h = 2, d = 8); 
    }   
}

module battery_holder() {
    difference() {
        color([1, 1, 1]) cube(dim_battery_holder);
        translate([-2, 1, 1]) {
            cube([22.54, 38.21, 75.7]);
        }
    }
    
    translate([10, 29, 5]) {
        battery_18650();
    }
    
    translate([10, 10, 5]) {
        battery_18650();
    }    
}

module filter_adapter() {
    difference() {
        rotate([90, 0, 0]) cylinder(h=3, d=82);
        translate([0, 1, 0]) rotate([90, 0, 0]) cylinder(h=5, d=77);
    }
}

module rotated_prism(l, w, h) {
    translate([l, w, 0]) rotate([0, 0, 180]) prism(l, w, h);
}

// ----- support ------- //

module triangle(width, height) {
   
    // a^2 = c^2
    // a = sqrt ( c^2 / 2 )
                
    a       = sqrt(pow(height, 2) / 2);
                
    translate([0, 0, -a]) {
        intersection() {
            rotate([45, 0, 0]) cube([width, height, height]);
            translate([0, -a, a]) cube([width, a, a]);
        }
    } 
}   

module prism(l, w, h){
    polyhedron(points=[[0,0,0], [l,0,0], [l,w,0], [0,w,0], [0,w,h], [l,w,h]], faces=[[0,1,2,3],[5,4,3,2],[0,4,5,1],[0,3,4],[5,2,1]]);
}
